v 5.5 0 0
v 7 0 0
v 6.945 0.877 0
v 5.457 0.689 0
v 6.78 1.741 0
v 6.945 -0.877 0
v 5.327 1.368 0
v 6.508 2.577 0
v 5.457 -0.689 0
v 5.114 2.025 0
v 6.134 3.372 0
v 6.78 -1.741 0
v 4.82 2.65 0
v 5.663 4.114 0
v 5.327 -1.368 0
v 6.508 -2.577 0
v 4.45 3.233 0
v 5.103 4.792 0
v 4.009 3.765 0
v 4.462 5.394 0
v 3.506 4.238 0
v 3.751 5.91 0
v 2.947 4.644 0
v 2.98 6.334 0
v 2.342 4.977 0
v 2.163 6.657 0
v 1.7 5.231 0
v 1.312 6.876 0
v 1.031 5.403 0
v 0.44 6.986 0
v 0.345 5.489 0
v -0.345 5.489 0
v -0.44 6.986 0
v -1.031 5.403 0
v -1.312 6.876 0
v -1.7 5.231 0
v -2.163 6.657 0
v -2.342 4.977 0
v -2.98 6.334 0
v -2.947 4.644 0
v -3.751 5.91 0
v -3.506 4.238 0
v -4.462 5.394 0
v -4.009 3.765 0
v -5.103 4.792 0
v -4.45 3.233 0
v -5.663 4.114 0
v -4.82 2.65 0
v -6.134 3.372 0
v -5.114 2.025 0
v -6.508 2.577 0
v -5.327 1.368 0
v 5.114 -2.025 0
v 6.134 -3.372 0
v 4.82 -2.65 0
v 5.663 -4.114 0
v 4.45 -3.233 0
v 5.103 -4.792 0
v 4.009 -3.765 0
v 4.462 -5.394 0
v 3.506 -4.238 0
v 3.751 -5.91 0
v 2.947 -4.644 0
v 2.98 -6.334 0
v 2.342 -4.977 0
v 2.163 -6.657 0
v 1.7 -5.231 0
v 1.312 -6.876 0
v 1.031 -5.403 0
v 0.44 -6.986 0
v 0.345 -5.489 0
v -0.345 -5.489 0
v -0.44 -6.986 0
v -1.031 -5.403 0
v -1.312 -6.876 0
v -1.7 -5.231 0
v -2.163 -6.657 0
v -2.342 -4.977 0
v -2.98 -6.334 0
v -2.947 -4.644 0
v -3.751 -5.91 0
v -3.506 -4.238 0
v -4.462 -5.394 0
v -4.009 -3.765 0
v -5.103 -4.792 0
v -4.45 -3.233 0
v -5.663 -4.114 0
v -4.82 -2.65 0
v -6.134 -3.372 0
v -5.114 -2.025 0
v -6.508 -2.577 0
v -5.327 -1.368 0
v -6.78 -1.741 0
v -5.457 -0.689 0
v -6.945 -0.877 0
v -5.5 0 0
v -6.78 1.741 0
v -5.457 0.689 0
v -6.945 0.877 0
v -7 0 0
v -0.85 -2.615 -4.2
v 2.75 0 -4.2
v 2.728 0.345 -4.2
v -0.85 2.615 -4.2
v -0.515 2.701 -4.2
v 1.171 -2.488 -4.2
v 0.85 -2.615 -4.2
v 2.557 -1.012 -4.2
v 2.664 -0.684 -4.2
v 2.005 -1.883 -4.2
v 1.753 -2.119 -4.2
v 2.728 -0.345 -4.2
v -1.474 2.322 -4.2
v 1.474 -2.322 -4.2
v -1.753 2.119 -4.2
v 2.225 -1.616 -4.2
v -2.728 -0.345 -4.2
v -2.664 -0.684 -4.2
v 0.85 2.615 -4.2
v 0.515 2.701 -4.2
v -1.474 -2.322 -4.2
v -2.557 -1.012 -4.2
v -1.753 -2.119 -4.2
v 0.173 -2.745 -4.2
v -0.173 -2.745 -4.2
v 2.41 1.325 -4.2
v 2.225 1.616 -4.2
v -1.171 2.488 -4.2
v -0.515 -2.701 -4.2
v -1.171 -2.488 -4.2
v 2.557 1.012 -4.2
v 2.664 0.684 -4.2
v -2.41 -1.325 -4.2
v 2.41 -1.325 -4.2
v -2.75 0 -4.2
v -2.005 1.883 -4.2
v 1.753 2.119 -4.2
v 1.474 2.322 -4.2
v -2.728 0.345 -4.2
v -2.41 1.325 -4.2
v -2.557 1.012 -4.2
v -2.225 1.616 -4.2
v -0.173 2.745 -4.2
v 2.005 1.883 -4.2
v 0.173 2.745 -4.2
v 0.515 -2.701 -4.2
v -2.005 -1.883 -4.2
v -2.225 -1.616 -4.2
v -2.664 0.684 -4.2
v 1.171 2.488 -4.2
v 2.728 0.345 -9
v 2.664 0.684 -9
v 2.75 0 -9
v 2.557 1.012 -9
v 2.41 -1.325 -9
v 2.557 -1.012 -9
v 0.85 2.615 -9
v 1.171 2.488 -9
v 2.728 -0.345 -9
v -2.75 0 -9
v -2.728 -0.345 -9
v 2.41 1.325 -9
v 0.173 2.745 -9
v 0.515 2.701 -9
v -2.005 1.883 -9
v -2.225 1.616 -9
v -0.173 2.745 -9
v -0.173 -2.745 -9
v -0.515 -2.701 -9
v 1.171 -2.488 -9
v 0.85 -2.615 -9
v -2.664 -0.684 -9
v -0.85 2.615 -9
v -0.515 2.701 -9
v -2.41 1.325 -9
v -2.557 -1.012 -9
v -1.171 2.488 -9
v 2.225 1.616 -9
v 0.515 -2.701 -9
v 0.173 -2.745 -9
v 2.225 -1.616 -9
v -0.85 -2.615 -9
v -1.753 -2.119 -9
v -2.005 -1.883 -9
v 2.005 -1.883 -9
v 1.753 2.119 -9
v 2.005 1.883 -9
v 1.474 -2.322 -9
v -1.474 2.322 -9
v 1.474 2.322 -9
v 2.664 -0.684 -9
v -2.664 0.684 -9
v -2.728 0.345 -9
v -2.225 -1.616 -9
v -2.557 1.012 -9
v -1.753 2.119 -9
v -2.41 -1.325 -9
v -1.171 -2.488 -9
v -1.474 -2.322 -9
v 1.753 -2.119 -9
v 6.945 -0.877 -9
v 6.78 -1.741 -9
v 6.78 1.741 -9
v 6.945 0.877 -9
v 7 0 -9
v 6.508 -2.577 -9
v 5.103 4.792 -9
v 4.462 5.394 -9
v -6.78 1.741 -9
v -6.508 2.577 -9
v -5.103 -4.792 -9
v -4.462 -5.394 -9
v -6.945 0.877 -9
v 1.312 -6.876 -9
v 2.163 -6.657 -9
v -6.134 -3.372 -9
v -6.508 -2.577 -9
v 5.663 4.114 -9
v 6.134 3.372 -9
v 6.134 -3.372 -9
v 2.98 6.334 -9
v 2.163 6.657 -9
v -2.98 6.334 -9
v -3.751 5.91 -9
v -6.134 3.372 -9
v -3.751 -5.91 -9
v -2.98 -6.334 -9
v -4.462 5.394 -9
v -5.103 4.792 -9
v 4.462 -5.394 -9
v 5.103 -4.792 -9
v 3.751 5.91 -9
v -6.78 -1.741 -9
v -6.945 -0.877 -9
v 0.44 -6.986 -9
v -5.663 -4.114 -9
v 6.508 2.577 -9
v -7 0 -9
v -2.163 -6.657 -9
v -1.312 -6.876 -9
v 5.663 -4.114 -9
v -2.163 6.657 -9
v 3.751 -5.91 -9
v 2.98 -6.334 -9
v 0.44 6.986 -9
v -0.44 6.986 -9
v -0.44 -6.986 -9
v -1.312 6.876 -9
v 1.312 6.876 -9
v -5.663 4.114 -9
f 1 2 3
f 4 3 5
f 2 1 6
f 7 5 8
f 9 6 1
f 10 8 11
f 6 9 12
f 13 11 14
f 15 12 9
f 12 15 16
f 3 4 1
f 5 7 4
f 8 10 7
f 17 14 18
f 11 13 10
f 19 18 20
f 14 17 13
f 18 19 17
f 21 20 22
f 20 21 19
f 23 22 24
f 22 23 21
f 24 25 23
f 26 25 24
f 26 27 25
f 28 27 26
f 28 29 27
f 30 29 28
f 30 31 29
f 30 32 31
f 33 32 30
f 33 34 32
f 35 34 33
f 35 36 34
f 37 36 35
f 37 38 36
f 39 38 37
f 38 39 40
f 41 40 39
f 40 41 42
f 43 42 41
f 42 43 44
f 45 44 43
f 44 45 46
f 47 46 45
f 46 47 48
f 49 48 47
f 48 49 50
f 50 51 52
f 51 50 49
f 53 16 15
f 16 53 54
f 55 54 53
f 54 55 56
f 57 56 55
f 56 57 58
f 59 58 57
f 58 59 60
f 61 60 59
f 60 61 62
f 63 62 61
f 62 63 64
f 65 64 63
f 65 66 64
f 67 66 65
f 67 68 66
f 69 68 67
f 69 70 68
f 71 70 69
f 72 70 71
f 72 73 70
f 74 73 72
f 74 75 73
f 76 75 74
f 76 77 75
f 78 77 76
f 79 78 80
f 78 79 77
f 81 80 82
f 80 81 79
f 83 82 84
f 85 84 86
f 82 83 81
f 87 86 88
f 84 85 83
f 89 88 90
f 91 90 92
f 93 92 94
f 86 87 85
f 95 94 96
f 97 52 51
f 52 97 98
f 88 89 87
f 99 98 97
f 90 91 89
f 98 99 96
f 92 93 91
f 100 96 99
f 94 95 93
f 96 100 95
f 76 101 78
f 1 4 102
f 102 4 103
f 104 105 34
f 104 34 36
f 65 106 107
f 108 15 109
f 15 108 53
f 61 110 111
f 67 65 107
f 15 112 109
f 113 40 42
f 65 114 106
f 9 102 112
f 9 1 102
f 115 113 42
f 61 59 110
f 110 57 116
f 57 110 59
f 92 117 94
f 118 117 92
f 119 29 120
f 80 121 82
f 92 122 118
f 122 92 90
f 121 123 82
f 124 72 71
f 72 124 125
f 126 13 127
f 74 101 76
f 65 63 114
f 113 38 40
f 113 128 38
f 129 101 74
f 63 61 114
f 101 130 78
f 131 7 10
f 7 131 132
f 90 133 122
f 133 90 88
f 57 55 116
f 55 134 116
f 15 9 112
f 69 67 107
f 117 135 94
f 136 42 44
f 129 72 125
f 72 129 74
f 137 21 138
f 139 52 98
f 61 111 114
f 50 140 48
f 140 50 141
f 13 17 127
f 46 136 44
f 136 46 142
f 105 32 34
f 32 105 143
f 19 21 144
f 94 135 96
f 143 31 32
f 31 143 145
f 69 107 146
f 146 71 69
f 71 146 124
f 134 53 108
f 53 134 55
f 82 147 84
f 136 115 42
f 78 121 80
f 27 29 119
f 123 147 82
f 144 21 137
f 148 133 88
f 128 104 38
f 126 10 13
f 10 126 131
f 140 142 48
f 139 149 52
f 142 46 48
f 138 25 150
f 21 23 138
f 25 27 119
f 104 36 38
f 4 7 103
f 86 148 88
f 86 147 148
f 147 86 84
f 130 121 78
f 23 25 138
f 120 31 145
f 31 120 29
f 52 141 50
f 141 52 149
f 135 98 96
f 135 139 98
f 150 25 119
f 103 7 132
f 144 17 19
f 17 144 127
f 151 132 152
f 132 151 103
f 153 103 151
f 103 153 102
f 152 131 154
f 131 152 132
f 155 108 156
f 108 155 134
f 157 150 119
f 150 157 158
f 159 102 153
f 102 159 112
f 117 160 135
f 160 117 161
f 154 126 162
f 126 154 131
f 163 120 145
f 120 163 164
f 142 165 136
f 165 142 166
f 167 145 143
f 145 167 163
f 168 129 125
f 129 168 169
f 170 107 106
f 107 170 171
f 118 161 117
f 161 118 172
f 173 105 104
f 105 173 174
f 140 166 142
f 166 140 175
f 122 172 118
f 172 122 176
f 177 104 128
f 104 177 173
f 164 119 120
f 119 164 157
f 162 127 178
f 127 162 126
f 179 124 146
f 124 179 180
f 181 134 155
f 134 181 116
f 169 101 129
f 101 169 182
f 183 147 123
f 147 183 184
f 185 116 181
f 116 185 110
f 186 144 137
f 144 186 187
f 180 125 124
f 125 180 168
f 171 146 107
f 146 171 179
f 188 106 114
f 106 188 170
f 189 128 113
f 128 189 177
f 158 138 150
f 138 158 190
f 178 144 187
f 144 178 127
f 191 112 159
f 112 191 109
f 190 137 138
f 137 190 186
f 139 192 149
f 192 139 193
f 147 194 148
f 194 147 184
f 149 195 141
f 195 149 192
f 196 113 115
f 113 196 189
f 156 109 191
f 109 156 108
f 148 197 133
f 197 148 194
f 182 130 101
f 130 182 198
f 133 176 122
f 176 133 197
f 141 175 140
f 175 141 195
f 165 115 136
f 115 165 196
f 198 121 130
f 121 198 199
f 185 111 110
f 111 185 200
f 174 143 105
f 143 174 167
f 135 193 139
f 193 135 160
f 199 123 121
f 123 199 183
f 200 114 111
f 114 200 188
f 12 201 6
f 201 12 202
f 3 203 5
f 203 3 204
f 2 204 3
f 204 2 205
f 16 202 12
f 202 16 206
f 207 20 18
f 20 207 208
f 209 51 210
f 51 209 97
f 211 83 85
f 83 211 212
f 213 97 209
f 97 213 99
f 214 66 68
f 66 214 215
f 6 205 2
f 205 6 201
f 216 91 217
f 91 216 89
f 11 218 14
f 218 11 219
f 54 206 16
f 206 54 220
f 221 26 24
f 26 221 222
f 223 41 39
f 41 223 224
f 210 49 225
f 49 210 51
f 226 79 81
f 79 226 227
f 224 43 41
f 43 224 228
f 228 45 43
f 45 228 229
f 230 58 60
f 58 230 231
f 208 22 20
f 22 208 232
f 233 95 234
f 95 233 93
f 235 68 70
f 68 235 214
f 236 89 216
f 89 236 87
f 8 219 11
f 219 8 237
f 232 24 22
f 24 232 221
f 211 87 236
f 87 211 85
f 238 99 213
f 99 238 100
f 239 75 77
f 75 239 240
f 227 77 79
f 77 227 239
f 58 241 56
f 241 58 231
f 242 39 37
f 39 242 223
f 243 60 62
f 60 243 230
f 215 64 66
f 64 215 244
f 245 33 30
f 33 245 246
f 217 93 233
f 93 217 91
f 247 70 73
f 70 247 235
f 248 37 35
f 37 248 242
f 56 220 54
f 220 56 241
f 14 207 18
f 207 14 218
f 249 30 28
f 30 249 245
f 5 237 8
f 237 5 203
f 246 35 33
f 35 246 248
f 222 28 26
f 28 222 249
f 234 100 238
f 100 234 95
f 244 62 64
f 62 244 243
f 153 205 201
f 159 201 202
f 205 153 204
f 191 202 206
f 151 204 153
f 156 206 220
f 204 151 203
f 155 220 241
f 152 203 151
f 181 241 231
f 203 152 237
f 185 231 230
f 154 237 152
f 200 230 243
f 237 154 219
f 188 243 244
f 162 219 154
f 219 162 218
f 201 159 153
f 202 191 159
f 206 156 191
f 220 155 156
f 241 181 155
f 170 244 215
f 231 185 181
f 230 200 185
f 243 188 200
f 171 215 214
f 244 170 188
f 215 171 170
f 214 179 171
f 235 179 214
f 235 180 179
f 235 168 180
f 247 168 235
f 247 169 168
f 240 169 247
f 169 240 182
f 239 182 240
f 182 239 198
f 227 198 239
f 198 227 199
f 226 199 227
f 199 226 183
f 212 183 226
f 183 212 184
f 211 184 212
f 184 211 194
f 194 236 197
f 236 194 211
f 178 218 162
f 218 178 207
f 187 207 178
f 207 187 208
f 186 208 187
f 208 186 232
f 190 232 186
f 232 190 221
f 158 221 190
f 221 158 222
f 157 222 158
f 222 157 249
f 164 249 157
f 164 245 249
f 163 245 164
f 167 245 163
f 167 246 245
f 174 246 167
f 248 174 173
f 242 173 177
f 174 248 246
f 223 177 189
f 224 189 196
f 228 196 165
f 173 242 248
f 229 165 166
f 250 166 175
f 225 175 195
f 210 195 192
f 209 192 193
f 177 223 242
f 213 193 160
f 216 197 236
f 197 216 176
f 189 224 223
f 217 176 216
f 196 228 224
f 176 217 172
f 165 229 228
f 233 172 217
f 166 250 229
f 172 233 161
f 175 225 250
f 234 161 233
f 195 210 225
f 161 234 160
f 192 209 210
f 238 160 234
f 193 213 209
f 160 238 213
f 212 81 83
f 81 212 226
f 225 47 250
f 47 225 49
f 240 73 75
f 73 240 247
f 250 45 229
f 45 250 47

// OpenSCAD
$fn = 50;

difference() {
	union() {
		translate(v = [0, 0, -9.0]) {
			cylinder(h = 9, r = 7.0);
		}
	}
	union() {
		translate(v = [0, 0, 0]) {
			rotate(a = [0, 0, 0]) {
				difference() {
					union() {
						translate(v = [0, 0, -12.0]) {
							cylinder(h = 12, r = 2.25);
						}
						translate(v = [0, 0, -4.2]) {
							cylinder(h = 4.2, r1 = 2.75, r2 = 5.5);
						}
						translate(v = [0, 0, -12.0]) {
							cylinder(h = 12, r = 2.75);
						}
						translate(v = [0, 0, -12.0]) {
							cylinder(h = 12, r = 2.25);
						}
					}
					union();
				}
			}
		}
	}
}
